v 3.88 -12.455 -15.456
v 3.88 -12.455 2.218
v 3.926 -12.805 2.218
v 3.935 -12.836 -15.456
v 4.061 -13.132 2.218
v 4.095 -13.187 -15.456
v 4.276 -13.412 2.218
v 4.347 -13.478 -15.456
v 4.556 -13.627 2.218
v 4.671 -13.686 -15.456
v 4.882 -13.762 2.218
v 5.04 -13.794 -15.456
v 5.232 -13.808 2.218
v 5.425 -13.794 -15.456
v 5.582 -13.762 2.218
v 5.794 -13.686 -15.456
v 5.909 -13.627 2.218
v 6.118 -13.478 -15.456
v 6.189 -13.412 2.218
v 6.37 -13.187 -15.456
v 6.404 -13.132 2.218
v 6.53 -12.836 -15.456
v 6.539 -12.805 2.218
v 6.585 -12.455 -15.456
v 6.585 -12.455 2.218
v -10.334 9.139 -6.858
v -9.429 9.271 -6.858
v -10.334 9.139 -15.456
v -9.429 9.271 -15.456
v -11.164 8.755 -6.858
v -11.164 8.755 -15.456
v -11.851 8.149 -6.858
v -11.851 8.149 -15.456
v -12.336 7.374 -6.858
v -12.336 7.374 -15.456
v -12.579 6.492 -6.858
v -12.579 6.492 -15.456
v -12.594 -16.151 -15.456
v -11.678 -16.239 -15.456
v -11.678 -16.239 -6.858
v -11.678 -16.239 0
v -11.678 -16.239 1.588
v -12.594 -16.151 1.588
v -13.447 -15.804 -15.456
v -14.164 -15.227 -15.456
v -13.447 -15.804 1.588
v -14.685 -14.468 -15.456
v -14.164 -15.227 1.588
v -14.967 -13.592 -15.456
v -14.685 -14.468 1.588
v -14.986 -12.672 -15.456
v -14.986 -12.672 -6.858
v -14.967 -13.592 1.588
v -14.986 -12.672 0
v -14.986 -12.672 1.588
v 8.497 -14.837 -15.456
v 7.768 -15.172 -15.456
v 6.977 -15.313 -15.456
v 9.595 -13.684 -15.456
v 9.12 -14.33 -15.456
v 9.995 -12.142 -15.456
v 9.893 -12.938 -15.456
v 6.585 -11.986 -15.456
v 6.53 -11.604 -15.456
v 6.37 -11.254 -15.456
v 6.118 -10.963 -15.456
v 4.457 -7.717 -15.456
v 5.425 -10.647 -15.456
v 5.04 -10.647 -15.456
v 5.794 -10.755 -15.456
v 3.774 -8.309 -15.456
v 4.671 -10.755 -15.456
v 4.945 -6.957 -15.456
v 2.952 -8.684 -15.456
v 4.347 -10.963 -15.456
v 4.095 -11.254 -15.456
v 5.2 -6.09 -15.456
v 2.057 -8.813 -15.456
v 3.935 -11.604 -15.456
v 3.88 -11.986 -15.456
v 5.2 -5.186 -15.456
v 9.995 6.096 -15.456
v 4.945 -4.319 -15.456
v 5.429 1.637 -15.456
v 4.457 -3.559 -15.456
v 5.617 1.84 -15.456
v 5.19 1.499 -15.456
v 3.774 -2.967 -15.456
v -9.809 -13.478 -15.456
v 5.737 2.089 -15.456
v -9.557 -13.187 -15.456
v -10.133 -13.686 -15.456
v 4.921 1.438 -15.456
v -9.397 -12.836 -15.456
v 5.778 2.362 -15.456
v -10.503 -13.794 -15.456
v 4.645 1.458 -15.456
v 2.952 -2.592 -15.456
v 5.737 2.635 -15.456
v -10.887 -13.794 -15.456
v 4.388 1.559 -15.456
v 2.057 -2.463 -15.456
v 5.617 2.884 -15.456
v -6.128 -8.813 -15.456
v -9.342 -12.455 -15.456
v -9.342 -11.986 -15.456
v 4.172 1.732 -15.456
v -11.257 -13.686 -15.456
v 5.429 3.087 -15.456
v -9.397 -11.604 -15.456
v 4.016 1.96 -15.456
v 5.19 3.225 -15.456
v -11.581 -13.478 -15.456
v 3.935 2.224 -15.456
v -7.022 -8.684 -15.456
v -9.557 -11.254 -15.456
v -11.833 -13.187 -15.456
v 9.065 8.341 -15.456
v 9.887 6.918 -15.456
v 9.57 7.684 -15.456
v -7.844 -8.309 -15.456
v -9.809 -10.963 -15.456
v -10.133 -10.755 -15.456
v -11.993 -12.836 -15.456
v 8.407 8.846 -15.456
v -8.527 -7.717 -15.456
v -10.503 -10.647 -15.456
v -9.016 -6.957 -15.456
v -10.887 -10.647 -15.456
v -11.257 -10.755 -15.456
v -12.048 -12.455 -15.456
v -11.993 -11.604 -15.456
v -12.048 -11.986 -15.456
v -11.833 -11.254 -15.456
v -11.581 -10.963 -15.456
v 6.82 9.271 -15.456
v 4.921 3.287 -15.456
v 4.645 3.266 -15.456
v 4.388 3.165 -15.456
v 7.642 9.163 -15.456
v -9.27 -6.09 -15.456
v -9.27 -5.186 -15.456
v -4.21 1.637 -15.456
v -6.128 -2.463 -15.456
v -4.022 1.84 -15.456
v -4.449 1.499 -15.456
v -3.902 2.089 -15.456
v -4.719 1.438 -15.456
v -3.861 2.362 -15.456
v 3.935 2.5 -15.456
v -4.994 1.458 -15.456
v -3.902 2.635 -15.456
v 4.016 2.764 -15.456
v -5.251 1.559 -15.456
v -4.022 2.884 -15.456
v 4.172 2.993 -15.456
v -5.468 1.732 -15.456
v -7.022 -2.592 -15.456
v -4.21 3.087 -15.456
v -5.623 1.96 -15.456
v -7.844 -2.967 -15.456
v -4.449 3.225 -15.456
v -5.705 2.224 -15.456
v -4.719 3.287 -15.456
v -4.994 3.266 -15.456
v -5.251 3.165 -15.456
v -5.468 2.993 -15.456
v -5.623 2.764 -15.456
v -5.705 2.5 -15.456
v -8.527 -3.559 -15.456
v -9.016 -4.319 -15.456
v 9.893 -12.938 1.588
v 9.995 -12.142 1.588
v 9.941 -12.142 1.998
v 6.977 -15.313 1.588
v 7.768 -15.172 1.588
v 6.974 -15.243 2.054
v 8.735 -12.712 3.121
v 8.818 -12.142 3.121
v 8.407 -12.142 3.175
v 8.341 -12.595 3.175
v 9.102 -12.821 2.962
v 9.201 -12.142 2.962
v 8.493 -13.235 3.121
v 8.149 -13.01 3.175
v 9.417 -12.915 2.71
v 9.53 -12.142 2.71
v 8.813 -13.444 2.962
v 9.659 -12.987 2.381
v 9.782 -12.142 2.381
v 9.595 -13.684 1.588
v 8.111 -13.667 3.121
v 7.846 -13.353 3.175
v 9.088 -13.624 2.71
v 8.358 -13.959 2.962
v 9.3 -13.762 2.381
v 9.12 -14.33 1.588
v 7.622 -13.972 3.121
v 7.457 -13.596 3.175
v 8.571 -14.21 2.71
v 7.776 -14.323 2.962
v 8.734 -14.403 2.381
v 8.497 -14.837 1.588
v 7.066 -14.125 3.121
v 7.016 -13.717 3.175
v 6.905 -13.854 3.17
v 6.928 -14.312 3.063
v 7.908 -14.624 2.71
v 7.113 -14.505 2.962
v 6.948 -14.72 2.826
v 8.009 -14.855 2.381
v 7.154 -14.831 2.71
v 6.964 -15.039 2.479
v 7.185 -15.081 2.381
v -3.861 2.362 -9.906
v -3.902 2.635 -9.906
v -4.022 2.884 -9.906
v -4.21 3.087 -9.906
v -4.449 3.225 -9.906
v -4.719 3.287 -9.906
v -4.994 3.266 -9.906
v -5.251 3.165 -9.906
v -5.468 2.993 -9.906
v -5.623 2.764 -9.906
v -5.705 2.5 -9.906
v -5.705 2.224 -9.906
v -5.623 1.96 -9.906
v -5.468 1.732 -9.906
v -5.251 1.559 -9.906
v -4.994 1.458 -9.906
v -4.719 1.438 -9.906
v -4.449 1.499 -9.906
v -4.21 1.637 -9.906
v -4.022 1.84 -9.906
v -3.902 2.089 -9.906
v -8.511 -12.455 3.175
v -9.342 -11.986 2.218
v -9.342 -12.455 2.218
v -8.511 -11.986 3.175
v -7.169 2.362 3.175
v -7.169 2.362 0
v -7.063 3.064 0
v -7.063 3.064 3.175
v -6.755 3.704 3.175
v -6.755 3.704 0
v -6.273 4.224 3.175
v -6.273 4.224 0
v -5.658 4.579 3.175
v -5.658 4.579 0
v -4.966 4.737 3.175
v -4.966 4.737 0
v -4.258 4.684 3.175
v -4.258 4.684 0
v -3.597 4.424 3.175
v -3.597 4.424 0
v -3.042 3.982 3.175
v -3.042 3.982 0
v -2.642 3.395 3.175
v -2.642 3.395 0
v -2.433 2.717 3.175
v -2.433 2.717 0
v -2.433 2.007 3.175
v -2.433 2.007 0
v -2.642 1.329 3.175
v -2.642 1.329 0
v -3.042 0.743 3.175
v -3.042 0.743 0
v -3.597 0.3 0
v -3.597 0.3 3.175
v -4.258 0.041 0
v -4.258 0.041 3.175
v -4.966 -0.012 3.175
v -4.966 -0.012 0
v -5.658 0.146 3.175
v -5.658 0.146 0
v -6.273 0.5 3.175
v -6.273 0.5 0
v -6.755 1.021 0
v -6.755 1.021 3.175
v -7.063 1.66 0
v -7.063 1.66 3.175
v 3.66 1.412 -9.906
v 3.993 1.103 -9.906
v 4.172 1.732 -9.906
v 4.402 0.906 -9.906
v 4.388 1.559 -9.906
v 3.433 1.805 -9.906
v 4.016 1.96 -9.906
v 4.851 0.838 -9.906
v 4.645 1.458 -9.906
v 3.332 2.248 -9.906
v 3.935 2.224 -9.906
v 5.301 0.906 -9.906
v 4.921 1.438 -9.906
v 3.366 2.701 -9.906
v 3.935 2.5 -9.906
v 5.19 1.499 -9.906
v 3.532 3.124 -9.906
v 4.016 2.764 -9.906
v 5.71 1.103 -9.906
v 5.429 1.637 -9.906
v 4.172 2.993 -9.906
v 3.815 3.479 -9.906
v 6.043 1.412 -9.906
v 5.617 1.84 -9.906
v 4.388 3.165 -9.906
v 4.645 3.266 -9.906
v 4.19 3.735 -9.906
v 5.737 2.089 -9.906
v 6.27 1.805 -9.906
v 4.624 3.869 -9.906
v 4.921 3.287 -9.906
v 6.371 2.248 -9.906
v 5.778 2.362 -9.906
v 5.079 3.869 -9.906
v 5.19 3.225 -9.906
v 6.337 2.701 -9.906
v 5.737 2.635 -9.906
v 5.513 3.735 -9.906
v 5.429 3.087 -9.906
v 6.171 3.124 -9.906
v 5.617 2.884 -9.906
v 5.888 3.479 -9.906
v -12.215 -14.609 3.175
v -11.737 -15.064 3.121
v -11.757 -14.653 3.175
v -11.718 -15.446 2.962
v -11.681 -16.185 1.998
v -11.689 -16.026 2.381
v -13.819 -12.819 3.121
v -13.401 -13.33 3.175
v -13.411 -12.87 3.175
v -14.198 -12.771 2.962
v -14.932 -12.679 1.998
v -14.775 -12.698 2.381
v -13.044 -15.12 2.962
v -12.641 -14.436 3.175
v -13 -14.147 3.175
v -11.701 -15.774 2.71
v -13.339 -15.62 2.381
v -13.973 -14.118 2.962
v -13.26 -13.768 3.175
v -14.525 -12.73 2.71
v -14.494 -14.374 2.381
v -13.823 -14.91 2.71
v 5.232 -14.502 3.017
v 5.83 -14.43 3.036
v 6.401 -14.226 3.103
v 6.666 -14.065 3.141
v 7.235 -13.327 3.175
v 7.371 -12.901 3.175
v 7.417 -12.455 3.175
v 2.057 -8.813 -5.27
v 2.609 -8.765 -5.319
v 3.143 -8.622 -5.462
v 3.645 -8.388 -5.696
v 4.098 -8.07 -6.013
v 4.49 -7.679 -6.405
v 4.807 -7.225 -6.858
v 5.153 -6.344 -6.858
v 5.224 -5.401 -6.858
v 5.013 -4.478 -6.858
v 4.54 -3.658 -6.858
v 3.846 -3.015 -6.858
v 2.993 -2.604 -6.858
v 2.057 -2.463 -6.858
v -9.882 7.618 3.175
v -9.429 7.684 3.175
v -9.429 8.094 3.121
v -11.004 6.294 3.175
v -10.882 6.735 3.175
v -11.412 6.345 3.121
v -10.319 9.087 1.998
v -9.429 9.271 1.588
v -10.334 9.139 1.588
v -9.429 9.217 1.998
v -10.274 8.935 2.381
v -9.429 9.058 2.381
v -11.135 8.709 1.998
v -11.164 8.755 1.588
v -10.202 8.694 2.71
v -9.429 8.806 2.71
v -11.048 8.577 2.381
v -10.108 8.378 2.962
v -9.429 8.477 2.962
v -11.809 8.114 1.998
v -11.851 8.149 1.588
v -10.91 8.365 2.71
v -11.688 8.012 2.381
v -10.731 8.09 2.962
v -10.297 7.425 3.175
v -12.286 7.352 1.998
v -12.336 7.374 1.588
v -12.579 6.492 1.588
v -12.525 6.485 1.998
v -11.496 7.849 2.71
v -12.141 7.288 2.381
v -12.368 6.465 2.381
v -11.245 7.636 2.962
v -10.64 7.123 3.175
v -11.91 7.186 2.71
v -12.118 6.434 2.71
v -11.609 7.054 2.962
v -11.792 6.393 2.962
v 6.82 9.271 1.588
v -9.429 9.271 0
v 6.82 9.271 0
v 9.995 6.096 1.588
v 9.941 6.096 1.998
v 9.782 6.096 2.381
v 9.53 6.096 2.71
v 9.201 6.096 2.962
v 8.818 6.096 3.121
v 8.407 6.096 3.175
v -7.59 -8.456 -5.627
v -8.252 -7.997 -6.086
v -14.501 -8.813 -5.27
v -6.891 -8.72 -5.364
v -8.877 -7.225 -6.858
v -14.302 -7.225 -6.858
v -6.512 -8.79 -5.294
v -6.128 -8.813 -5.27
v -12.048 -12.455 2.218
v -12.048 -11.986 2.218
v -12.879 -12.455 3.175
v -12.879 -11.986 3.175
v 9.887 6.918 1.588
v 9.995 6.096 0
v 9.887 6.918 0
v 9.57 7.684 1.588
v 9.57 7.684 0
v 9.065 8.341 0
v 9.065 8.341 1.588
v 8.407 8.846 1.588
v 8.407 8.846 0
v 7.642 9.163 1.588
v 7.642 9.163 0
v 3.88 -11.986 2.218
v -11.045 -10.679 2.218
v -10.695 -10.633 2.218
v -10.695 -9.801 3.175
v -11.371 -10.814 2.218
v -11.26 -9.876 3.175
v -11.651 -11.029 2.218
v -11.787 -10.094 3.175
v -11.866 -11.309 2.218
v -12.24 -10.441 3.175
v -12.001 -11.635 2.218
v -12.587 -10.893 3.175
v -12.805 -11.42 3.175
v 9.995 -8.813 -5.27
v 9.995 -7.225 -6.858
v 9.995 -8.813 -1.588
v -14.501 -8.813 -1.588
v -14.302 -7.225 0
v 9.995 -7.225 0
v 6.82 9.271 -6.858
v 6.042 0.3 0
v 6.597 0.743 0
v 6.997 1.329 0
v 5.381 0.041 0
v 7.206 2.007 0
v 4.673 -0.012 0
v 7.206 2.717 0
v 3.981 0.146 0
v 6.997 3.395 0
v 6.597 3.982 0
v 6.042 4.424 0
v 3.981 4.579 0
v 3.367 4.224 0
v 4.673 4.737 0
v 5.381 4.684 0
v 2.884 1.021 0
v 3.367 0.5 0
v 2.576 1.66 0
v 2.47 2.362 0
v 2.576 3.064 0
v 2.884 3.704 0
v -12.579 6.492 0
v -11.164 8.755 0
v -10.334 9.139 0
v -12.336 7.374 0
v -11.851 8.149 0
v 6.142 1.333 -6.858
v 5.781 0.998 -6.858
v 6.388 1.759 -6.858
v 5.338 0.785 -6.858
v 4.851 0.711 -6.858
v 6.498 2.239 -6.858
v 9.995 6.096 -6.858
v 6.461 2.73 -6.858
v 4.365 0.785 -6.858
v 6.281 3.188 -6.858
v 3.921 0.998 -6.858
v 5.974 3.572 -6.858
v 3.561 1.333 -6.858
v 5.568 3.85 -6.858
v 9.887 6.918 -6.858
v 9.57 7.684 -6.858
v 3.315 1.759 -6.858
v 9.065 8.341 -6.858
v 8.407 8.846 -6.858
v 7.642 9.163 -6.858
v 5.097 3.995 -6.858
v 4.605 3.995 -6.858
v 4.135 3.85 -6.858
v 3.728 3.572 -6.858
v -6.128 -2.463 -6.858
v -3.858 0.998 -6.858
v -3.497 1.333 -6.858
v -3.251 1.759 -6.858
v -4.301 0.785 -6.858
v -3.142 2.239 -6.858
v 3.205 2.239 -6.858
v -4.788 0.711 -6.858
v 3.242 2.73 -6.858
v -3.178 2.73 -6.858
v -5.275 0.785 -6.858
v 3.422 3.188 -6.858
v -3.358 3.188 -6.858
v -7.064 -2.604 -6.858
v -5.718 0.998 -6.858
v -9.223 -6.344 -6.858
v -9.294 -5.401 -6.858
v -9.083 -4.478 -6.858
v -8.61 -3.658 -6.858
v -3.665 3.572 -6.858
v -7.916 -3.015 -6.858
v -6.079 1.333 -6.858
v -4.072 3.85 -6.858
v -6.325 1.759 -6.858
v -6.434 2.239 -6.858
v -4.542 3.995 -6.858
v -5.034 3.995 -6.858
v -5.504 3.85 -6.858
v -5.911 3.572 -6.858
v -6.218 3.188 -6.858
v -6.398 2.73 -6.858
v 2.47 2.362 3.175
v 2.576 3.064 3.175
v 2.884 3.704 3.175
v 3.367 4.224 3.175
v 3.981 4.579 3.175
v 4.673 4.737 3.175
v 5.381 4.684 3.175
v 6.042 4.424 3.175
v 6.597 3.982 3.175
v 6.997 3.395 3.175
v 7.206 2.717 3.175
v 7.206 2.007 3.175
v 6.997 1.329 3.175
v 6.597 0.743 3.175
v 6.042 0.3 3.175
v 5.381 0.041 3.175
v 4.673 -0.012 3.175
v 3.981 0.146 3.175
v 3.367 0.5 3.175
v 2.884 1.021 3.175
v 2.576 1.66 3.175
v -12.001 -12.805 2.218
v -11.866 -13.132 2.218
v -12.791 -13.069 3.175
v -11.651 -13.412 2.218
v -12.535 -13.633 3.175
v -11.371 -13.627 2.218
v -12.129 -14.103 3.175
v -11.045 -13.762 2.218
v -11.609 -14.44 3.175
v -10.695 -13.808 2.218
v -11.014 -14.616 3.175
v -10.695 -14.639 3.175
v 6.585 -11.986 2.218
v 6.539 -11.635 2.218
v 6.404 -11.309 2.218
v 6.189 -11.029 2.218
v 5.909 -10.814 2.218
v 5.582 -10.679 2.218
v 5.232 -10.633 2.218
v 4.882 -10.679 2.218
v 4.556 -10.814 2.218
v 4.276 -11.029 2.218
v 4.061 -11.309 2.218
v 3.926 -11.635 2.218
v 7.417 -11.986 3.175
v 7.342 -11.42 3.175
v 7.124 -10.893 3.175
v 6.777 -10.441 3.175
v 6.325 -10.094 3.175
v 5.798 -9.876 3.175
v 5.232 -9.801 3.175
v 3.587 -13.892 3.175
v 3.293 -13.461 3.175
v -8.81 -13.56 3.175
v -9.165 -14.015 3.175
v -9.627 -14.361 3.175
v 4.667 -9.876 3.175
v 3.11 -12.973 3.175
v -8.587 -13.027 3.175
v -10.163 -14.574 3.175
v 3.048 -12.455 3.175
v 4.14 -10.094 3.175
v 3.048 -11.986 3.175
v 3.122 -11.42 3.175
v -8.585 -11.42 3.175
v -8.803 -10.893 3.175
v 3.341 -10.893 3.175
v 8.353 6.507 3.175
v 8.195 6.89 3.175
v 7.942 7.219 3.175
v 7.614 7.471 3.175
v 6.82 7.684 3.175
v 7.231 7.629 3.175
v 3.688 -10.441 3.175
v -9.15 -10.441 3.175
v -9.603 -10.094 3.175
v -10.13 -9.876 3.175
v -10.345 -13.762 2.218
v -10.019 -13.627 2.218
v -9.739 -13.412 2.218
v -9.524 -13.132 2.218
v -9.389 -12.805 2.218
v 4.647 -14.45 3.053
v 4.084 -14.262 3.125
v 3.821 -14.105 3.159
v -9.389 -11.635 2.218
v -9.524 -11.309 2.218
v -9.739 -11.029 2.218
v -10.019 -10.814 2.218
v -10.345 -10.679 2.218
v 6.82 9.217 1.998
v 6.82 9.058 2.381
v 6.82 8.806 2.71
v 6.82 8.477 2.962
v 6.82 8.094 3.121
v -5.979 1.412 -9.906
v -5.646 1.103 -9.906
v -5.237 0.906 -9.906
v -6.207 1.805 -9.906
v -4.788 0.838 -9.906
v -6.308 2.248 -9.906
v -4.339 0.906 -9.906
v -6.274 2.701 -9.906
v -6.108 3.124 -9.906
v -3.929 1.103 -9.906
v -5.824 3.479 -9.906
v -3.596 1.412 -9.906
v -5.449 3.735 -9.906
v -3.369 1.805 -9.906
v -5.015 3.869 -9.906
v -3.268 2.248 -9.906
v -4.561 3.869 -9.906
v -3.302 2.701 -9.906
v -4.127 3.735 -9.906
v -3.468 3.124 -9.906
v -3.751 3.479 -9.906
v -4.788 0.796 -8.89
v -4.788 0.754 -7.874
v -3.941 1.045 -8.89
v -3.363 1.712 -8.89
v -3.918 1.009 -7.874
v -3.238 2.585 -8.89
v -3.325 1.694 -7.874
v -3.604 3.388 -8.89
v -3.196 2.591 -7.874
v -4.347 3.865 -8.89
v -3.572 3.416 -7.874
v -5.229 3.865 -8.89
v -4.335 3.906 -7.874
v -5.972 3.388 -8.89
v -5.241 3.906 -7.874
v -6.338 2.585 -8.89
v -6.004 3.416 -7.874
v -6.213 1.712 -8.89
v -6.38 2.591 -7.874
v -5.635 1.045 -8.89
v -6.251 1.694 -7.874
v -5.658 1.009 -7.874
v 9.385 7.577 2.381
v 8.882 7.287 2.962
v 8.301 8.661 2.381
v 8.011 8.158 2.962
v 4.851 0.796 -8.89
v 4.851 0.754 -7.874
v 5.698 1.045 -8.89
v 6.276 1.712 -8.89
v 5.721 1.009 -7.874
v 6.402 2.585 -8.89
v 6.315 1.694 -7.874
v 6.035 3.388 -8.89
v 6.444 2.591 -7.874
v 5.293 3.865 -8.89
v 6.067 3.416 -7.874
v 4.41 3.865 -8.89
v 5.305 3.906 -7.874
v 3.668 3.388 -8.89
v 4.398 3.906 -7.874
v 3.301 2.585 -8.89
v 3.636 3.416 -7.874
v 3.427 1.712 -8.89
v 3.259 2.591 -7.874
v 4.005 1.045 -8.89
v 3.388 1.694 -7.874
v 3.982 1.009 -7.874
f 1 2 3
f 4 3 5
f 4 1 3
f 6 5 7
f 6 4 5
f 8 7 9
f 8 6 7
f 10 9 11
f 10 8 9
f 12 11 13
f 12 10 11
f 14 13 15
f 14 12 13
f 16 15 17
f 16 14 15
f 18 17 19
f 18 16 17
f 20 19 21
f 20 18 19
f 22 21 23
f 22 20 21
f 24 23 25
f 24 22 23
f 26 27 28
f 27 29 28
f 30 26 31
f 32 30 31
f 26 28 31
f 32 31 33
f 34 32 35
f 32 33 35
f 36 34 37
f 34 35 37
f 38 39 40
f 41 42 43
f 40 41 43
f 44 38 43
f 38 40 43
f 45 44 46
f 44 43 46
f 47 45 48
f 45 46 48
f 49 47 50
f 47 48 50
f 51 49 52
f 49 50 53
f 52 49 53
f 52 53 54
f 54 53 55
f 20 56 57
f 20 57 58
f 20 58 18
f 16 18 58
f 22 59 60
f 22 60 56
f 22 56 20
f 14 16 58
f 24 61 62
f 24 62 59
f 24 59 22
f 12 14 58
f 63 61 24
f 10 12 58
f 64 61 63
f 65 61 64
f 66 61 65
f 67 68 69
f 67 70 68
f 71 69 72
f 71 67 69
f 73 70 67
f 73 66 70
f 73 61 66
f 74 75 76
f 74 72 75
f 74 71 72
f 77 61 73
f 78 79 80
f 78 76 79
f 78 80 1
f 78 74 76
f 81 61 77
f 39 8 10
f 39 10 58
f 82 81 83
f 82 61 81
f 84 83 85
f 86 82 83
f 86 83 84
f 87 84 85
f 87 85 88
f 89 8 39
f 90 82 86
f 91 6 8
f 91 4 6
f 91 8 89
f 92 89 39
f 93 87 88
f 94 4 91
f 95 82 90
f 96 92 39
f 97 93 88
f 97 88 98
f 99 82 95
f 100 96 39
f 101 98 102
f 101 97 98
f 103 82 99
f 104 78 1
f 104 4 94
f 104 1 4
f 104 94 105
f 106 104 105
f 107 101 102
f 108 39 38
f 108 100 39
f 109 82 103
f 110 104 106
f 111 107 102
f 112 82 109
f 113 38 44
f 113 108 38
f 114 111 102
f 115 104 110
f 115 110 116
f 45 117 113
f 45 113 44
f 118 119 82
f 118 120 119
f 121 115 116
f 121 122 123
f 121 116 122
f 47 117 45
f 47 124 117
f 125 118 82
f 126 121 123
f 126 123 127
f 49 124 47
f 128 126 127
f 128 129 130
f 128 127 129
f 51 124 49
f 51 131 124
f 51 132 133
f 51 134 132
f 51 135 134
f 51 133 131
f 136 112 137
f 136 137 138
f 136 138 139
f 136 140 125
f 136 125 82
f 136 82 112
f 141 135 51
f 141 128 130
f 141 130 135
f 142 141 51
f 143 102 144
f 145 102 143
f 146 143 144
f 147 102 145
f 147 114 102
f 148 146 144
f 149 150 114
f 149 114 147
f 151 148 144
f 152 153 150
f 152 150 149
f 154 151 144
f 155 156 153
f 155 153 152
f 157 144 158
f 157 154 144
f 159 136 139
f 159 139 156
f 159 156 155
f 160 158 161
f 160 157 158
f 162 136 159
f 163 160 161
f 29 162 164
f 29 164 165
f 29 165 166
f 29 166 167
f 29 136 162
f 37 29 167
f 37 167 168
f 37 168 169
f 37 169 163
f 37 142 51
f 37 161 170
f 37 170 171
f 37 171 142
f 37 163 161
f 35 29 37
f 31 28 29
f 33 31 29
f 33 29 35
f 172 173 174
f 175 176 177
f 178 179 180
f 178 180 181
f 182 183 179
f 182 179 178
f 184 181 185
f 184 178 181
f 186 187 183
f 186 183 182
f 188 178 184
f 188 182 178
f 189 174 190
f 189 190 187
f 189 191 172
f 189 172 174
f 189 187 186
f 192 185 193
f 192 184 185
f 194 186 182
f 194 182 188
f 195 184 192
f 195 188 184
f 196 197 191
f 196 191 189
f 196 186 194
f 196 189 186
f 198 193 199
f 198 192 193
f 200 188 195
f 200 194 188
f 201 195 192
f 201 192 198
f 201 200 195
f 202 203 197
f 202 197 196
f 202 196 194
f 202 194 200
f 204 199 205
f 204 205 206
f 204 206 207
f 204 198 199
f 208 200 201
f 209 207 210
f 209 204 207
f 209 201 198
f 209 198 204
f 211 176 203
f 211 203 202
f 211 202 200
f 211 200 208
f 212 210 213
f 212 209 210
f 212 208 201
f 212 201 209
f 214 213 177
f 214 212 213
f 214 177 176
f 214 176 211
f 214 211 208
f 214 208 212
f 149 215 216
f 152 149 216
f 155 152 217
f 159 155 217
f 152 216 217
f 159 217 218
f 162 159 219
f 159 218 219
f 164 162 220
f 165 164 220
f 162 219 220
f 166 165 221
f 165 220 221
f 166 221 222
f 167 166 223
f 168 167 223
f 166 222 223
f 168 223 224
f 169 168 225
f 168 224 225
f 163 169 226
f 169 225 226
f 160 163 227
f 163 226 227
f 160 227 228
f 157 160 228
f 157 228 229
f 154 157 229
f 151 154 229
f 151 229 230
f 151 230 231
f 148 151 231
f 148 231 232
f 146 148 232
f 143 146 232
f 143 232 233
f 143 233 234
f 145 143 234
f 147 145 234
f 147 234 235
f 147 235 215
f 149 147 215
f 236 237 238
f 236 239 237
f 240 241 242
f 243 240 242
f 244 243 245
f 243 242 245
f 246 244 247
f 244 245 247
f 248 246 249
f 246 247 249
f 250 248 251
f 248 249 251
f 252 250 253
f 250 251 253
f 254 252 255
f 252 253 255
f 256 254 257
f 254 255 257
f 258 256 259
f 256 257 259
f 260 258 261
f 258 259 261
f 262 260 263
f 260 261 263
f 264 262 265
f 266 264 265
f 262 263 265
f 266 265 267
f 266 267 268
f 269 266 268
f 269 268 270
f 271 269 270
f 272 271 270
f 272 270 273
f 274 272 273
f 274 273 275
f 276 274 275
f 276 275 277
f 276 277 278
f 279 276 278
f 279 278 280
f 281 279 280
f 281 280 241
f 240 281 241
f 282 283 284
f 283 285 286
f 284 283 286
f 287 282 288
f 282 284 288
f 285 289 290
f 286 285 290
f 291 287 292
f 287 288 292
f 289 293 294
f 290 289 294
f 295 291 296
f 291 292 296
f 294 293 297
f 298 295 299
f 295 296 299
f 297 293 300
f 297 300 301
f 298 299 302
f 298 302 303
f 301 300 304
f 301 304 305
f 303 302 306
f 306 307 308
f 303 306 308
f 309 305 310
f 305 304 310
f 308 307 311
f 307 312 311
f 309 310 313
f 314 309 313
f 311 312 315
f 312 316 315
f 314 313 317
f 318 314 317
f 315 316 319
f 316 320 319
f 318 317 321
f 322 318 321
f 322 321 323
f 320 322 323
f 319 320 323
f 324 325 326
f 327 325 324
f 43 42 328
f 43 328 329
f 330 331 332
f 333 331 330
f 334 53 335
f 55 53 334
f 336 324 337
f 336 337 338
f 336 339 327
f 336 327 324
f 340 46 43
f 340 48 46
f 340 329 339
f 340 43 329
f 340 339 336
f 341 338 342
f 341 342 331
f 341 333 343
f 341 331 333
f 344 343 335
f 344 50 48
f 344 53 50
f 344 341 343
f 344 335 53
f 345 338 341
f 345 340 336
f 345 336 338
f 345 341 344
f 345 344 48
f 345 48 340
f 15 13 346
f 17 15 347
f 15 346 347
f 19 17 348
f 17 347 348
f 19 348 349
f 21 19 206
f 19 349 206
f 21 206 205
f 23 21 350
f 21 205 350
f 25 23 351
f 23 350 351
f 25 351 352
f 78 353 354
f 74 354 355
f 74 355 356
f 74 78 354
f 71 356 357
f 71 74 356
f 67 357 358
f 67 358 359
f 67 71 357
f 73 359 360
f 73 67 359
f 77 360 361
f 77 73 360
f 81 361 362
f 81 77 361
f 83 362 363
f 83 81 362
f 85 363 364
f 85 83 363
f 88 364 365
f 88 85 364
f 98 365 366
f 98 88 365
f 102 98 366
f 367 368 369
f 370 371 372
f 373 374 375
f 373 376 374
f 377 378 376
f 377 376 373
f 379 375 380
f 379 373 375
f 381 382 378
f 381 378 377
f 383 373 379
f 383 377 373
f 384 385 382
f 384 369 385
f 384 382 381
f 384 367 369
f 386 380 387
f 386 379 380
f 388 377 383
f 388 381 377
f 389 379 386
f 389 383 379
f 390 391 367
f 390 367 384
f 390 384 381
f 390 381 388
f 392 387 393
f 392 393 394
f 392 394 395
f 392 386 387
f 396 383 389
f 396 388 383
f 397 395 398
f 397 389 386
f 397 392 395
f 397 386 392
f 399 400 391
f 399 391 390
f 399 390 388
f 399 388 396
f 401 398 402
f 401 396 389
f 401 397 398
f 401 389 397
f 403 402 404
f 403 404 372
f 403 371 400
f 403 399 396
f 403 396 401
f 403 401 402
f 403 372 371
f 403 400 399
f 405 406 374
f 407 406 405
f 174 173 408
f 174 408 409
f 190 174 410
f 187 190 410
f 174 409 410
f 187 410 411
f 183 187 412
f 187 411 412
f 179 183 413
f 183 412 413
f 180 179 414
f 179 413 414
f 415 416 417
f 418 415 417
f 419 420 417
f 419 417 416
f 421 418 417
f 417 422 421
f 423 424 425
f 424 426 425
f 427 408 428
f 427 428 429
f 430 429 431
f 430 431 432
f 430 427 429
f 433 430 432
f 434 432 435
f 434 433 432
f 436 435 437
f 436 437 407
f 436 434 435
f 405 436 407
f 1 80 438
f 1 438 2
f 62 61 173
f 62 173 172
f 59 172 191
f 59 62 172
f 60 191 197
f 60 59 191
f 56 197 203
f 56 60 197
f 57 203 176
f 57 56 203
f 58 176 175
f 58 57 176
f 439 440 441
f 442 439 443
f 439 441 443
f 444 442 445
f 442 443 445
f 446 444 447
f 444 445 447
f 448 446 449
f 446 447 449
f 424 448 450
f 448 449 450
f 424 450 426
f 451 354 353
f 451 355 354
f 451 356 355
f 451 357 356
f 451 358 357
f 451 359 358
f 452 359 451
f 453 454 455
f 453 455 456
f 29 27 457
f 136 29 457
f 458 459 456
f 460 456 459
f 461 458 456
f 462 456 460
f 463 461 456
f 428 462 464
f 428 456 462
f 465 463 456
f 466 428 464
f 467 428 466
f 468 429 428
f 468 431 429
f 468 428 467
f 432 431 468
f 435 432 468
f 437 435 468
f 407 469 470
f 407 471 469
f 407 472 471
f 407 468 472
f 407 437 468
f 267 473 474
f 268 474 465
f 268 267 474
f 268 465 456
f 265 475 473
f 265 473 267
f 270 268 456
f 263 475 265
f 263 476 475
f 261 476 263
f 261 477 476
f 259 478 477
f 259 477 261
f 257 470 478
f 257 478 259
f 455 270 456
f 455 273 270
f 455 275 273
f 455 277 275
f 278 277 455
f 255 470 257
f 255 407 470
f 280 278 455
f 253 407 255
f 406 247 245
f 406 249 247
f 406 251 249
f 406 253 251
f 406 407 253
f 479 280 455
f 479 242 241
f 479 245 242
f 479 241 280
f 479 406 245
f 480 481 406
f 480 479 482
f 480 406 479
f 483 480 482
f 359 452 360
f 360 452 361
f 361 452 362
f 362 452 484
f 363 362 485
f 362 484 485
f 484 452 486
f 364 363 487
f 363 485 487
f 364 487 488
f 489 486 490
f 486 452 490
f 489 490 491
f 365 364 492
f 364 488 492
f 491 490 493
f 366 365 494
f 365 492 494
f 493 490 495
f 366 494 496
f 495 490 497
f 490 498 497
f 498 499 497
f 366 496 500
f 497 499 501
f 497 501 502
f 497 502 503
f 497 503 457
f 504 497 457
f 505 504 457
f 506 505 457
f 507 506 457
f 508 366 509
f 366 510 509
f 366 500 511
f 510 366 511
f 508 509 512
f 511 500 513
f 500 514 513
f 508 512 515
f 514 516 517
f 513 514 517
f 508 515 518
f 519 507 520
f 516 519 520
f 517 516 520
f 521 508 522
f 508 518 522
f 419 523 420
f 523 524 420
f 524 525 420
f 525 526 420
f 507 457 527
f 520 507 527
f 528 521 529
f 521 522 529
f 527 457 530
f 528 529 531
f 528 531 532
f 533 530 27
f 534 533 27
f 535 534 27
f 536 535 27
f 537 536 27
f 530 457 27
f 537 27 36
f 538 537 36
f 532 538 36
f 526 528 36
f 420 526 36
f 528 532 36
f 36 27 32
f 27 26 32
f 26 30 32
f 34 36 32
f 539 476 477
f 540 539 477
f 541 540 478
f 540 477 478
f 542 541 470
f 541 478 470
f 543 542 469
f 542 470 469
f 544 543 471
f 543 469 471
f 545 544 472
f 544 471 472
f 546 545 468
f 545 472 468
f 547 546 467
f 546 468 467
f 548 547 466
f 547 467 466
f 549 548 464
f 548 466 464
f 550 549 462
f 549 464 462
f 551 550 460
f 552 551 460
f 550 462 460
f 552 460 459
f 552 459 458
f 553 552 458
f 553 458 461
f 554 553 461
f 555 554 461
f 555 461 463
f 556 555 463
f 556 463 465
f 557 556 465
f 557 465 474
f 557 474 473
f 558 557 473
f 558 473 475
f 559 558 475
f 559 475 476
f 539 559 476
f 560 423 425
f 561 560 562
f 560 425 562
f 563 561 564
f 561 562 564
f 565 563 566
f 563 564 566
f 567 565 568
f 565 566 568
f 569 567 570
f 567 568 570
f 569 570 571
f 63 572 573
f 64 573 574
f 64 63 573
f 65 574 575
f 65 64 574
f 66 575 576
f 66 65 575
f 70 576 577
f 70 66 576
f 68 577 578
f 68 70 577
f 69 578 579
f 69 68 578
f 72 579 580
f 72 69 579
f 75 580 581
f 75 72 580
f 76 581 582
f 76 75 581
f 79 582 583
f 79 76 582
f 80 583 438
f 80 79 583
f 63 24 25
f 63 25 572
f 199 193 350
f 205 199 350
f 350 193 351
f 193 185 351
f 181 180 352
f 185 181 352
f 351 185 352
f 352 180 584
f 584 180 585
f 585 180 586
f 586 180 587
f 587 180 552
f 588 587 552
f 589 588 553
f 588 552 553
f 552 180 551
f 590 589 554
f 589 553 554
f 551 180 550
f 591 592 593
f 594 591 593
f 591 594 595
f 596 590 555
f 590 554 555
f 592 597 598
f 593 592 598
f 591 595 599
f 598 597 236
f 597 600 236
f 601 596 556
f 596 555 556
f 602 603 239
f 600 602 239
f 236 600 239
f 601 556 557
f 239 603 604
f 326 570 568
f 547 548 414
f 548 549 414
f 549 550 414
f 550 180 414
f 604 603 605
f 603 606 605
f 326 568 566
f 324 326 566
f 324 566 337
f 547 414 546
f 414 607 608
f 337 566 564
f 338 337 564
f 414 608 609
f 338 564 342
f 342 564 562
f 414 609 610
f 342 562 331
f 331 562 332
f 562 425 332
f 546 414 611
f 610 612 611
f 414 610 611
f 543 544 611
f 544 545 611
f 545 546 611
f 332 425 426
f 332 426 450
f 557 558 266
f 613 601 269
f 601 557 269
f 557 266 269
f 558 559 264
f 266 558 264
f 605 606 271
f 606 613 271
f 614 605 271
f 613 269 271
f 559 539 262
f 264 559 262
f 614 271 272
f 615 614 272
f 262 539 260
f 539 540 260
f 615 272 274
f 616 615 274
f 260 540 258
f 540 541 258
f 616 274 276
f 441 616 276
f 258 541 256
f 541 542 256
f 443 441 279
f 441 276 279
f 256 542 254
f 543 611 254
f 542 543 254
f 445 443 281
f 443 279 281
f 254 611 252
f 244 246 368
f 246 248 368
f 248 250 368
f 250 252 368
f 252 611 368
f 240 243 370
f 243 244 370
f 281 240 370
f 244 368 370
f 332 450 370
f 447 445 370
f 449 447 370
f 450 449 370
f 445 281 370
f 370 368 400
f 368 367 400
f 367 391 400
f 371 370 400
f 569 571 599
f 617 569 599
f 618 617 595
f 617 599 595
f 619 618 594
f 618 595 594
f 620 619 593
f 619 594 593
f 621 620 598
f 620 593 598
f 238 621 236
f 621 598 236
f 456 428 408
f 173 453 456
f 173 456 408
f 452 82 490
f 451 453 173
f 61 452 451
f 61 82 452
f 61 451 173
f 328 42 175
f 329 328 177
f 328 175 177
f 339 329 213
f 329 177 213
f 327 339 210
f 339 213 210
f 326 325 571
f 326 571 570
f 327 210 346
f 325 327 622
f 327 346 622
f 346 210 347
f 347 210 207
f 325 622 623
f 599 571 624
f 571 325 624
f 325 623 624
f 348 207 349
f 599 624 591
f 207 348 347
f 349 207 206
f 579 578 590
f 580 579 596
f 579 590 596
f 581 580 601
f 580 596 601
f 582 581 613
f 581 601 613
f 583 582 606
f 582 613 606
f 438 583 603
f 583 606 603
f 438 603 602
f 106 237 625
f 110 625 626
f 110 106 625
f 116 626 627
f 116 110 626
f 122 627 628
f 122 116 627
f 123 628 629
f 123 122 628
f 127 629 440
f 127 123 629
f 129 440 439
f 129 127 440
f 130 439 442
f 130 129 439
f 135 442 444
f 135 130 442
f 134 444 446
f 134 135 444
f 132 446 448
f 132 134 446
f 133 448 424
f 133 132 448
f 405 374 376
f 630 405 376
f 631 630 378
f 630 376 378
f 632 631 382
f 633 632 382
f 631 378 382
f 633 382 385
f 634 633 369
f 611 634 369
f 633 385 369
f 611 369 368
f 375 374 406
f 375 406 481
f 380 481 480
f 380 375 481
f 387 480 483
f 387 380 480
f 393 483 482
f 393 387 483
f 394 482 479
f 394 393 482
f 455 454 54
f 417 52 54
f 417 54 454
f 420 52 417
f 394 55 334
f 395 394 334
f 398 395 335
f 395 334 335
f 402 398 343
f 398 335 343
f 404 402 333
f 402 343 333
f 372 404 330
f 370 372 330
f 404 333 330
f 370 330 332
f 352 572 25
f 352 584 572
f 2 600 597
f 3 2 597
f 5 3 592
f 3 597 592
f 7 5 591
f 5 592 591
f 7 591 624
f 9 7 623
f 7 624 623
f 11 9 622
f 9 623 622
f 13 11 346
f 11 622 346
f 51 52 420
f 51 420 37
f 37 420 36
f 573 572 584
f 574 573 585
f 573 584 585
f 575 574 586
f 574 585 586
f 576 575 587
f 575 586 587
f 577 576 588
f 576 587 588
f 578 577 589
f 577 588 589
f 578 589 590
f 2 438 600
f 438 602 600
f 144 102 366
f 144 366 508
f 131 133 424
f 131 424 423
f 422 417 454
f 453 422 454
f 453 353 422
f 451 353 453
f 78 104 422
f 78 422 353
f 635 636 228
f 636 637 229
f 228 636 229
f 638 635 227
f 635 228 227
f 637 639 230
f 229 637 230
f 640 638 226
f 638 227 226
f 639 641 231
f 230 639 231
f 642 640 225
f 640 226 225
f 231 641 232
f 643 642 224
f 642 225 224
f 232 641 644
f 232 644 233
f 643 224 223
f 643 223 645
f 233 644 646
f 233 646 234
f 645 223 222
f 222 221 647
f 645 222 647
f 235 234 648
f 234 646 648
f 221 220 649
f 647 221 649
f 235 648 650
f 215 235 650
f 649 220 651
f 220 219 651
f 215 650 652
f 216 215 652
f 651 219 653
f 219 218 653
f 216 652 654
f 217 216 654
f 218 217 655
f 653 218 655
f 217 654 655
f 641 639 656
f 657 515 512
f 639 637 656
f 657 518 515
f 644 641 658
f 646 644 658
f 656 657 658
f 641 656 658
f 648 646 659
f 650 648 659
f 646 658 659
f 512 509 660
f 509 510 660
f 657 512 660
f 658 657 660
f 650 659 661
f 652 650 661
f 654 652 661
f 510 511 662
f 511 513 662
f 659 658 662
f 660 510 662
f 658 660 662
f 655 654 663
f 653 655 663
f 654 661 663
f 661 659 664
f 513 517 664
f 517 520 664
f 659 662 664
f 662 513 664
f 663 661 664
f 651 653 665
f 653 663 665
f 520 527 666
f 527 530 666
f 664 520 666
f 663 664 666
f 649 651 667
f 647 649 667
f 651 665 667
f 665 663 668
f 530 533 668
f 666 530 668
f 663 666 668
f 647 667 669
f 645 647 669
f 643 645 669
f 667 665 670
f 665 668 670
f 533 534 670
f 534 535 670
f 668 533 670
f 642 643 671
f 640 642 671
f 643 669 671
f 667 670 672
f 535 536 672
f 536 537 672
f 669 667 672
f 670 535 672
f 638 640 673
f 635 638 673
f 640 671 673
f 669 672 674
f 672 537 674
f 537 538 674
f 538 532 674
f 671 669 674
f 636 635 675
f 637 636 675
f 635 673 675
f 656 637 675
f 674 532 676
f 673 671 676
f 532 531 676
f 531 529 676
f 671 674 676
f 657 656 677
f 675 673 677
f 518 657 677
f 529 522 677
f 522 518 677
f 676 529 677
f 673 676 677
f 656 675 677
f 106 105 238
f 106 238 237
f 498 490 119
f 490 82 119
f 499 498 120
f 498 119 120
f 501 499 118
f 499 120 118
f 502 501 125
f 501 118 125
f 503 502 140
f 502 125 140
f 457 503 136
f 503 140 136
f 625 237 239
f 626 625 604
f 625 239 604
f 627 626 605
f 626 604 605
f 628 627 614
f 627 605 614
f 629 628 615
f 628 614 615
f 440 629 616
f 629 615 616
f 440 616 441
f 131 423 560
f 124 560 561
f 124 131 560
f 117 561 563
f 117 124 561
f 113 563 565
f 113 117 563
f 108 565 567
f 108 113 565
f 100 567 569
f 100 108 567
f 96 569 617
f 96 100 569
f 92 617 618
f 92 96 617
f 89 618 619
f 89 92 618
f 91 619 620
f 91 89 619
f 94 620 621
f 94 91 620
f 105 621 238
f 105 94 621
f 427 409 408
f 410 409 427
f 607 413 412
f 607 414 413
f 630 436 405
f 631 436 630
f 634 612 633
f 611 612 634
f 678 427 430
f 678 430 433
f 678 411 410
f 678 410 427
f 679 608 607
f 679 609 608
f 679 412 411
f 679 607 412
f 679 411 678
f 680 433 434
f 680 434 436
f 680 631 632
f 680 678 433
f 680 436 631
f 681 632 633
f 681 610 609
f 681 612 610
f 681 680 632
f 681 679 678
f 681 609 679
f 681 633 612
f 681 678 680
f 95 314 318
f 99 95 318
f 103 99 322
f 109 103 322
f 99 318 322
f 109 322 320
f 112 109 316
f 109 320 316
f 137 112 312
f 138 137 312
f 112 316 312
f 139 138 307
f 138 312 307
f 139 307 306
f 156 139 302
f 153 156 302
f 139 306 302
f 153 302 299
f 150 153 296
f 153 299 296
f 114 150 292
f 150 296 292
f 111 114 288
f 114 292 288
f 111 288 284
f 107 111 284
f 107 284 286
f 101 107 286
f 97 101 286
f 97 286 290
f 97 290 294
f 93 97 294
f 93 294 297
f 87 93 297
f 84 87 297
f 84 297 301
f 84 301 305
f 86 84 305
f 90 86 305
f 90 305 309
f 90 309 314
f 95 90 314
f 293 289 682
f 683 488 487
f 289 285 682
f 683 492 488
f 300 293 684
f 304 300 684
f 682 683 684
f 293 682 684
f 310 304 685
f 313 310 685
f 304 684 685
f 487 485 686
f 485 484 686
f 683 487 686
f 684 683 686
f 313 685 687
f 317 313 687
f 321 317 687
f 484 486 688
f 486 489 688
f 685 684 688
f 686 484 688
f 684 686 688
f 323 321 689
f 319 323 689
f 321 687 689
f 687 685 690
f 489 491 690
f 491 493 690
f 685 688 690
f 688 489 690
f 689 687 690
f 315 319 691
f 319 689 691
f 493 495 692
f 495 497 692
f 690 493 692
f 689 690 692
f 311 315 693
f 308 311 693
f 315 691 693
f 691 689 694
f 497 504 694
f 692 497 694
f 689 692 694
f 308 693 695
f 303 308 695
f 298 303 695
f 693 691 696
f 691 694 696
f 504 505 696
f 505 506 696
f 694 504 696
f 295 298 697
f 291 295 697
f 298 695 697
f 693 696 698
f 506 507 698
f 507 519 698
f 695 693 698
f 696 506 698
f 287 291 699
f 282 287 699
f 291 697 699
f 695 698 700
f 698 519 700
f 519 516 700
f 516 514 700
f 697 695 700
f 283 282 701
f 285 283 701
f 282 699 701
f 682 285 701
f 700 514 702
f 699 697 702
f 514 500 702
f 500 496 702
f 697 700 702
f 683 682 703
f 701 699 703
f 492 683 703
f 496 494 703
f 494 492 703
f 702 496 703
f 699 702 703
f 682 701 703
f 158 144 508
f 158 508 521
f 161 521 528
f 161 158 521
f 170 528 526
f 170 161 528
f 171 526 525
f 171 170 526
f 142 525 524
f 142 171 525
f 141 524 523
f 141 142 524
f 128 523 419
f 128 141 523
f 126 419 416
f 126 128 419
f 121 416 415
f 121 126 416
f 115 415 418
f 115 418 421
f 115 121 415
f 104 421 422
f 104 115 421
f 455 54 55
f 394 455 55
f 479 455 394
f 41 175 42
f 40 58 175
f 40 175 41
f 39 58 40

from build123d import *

# Parameters (mm, degrees)
BOSS_EXTRUDE1_DEPTH                           = 3.175
BOSS_EXTRUDE2_START                           = -6.858
BOSS_EXTRUDE2_DEPTH                           = 8.5979
BOSS_EXTRUDE3_DEPTH                           = 6.858
CSK_START                                     = -16
CSK_SLOT_FOR_2_FLAT_HEAD_MACHINE_SCREW1_DEPTH = 20
FILLET1_R                                     = 3.175
CHAMFER1_SIZE                                 = 1.5875
F_3_16_0_1875_DIAMETER_HOLE1_D                = 4.7625
F_3_16_0_1875_DIAMETER_HOLE1_DEPTH            = 3.175
F_0_CLEARANCE_HOLE1_D                         = 1.8542
HOLE1_AT_2_COUNT                              = 2
HOLE1_AT_2_PITCH                              = 9.6393
CUT_EXTRUDE2_REACH                            = 30.918
FILLET3_R                                     = 1.5875


with BuildPart() as part:
    # Sketch1 → Boss-Extrude1 (new body)
    with BuildSketch(Plane.XY):
        Polygon((9.9949, 9.271), (9.9949, -15.162995595), (-15.457511269, -16.426312325), (-12.2301, 9.271), align=None)
    extrude(amount=BOSS_EXTRUDE1_DEPTH)



with BuildPart() as body_2:
    # Sketch1<2> → Boss-Extrude2 (new body)
    with BuildSketch(Plane.XY.offset(BOSS_EXTRUDE2_START)):
        Polygon((9.9949, 9.271), (9.9949, -15.162995595), (-15.457511269, -16.426312325), (-12.2301, 9.271), align=None)
    extrude(amount=-BOSS_EXTRUDE2_DEPTH)


with BuildPart() as part_1:
    add(part.part)

    add(body_2.part)  # Boss-Extrude3 merges body 2
    # Sketch3 → Boss-Extrude3 (add)
    with BuildSketch(Plane.XY.offset(-6.858)):
        Polygon((9.9949, -8.812995595), (9.9949, -15.162995595), (-15.457511269, -16.426312325), (-14.501329397, -8.812995595), align=None)
    extrude(amount=BOSS_EXTRUDE3_DEPTH)

    # CSK SLOT for #2 Flat Head Machine Screw1: read off the stored shape, not the designer's step
    # CSK SLOT for _2 Flat Head Machine Sc 2 → CSK SLOT for #2 Flat Head Machine Screw1 (cut)
    with BuildSketch(Plane.XY.offset(CSK_START)):
        with BuildLine():
            Line((-9.342461269, -12.455421191), (-9.342461269, -11.985521191))
            ThreePointArc((-9.342461269, -11.985521191), (-10.695011269, -10.632971191), (-12.047561269, -11.985521191))
            Line((-12.047561269, -11.985521191), (-12.047561269, -12.455421191))
            ThreePointArc((-12.047561269, -12.455421191), (-10.695011269, -13.807971191), (-9.342461269, -12.455421191))
        make_face()
        with BuildLine():
            Line((6.58495, -12.455421191), (6.58495, -11.985521191))
            ThreePointArc((6.58495, -11.985521191), (5.2324, -10.632971191), (3.87985, -11.985521191))
            Line((3.87985, -11.985521191), (3.87985, -12.455421191))
            ThreePointArc((3.87985, -12.455421191), (5.2324, -13.807971191), (6.58495, -12.455421191))
        make_face()
    extrude(amount=CSK_SLOT_FOR_2_FLAT_HEAD_MACHINE_SCREW1_DEPTH, mode=Mode.SUBTRACT)

    # CSK SLOT for _2 Flat Head Machine Sc 3: loft between two sections, ruled curve by curve
    csk_slot_for_2_flat_head_machine_sc_3_from = [
        Edge.make_three_point_arc((-9.342461269, -11.985521191, 2.21806604), (-9.738613992, -11.029123914, 2.21806604), (-10.695011269, -10.632971191, 2.21806604)),
        Edge.make_three_point_arc((-10.695011269, -10.632971191, 2.21806604), (-11.651408546, -11.029123914, 2.21806604), (-12.047561269, -11.985521191, 2.21806604)),
        Edge.make_three_point_arc((-12.047561269, -12.455421191, 2.21806604), (-11.651408546, -13.411818468, 2.21806604), (-10.695011269, -13.807971191, 2.21806604)),
        Edge.make_three_point_arc((-10.695011269, -13.807971191, 2.21806604), (-9.738613992, -13.411818468, 2.21806604), (-9.342461269, -12.455421191, 2.21806604)),
        Edge.make_line((-12.047561269, -11.985521191, 2.21806604), (-12.047561269, -12.455421191, 2.21806604)),
        Edge.make_line((-9.342461269, -11.985521191, 2.21806604), (-9.342461269, -12.455421191, 2.21806604)),
    ]
    csk_slot_for_2_flat_head_machine_sc_3_to = [
        Edge.make_three_point_arc((-8.510611269, -11.985521191, 3.175), (-9.150407216, -10.440917138, 3.175), (-10.695011269, -9.801121191, 3.175)),
        Edge.make_three_point_arc((-10.695011269, -9.801121191, 3.175), (-12.239615322, -10.440917138, 3.175), (-12.879411269, -11.985521191, 3.175)),
        Edge.make_three_point_arc((-12.879411269, -12.455421191, 3.175), (-12.239615322, -14.000025244, 3.175), (-10.695011269, -14.639821191, 3.175)),
        Edge.make_three_point_arc((-10.695011269, -14.639821191, 3.175), (-9.150407216, -14.000025244, 3.175), (-8.510611269, -12.455421191, 3.175)),
        Edge.make_line((-12.879411269, -11.985521191, 3.175), (-12.879411269, -12.455421191, 3.175)),
        Edge.make_line((-8.510611269, -11.985521191, 3.175), (-8.510611269, -12.455421191, 3.175)),
    ]
    csk_slot_for_2_flat_head_machine_sc_3 = Solid(Shell([*[Face.make_surface_from_curves(csk_slot_for_2_flat_head_machine_sc_3_from[k], csk_slot_for_2_flat_head_machine_sc_3_to[k]) for k in range(6)], Face(Wire(csk_slot_for_2_flat_head_machine_sc_3_from)), Face(Wire(csk_slot_for_2_flat_head_machine_sc_3_to))]))
    add(csk_slot_for_2_flat_head_machine_sc_3, mode=Mode.SUBTRACT)

    # CSK SLOT for _2 Flat Head Machine Sc 4: loft between two sections, ruled curve by curve
    csk_slot_for_2_flat_head_machine_sc_4_from = [
        Edge.make_three_point_arc((6.58495, -11.985521191, 2.21806604), (6.188797277, -11.029123914, 2.21806604), (5.2324, -10.632971191, 2.21806604)),
        Edge.make_three_point_arc((5.2324, -10.632971191, 2.21806604), (4.276002723, -11.029123914, 2.21806604), (3.87985, -11.985521191, 2.21806604)),
        Edge.make_three_point_arc((3.87985, -12.455421191, 2.21806604), (4.276002723, -13.411818468, 2.21806604), (5.2324, -13.807971191, 2.21806604)),
        Edge.make_three_point_arc((5.2324, -13.807971191, 2.21806604), (6.188797277, -13.411818468, 2.21806604), (6.58495, -12.455421191, 2.21806604)),
        Edge.make_line((3.87985, -11.985521191, 2.21806604), (3.87985, -12.455421191, 2.21806604)),
        Edge.make_line((6.58495, -11.985521191, 2.21806604), (6.58495, -12.455421191, 2.21806604)),
    ]
    csk_slot_for_2_flat_head_machine_sc_4_to = [
        Edge.make_three_point_arc((7.4168, -11.985521191, 3.175), (6.777004053, -10.440917138, 3.175), (5.2324, -9.801121191, 3.175)),
        Edge.make_three_point_arc((5.2324, -9.801121191, 3.175), (3.687795947, -10.440917138, 3.175), (3.048, -11.985521191, 3.175)),
        Edge.make_three_point_arc((3.048, -12.455421191, 3.175), (3.687795947, -14.000025244, 3.175), (5.2324, -14.639821191, 3.175)),
        Edge.make_three_point_arc((5.2324, -14.639821191, 3.175), (6.777004053, -14.000025244, 3.175), (7.4168, -12.455421191, 3.175)),
        Edge.make_line((3.048, -11.985521191, 3.175), (3.048, -12.455421191, 3.175)),
        Edge.make_line((7.4168, -11.985521191, 3.175), (7.4168, -12.455421191, 3.175)),
    ]
    csk_slot_for_2_flat_head_machine_sc_4 = Solid(Shell([*[Face.make_surface_from_curves(csk_slot_for_2_flat_head_machine_sc_4_from[k], csk_slot_for_2_flat_head_machine_sc_4_to[k]) for k in range(6)], Face(Wire(csk_slot_for_2_flat_head_machine_sc_4_from)), Face(Wire(csk_slot_for_2_flat_head_machine_sc_4_to))]))
    add(csk_slot_for_2_flat_head_machine_sc_4, mode=Mode.SUBTRACT)

    # Fillet1
    fillet1_edges = [part_1.edges().sort_by_distance(p)[0] for p in [
        (-12.2301, 9.271, -11.15695),
        (9.9949, 9.271, -11.15695),
        (9.9949, 9.271, 1.5875),
        (9.9949, -15.162995595, -6.14045),
        (-15.457511269, -16.426312325, -6.14045),
        (-12.2301, 9.271, 1.5875),
    ]]
    fillet(fillet1_edges, radius=FILLET1_R)

    # Chamfer1
    chamfer1_edges = [part_1.edges().sort_by_distance(p)[0] for p in [
        (-2.253214698, -8.812995595, -6.858),
        (-2.253214698, -8.812995595, 0),
    ]]
    chamfer(chamfer1_edges, length=CHAMFER1_SIZE)

    # 3/16 (0.1875) Diameter Hole1
    with Locations(Plane.XY.offset(3.175)):
        with Locations((4.8514, 2.3622), (-4.7879, 2.3622)):
            Hole(F_3_16_0_1875_DIAMETER_HOLE1_D / 2, depth=F_3_16_0_1875_DIAMETER_HOLE1_DEPTH)

    # #0 Clearance Hole1 (through all)
    with Locations(Plane(origin=(0, 0, -15.4559), x_dir=(-1, 0, 0), z_dir=(0, 0, -1))):
        with Locations((-4.8514, 2.3622), (4.7879, 2.3622)):
            Hole(F_0_CLEARANCE_HOLE1_D / 2)

    # Sketch11 → Hole1 (revolve, cut)
    with BuildSketch(Plane(origin=(4.8514, 2.3622, -6.858), x_dir=(0, -1, 0), z_dir=(1, 0, 0))):
        Polygon((0, 0), (0, 3.048), (1.524, 3.048), (1.651, 0), align=None)
    hole1 = revolve(axis=Axis((4.8514, 2.3622, -116.858), (0, 0, 1)), mode=Mode.SUBTRACT)

    # Hole1 at 2: Hole1 ×2
    with Locations(*[(-i * HOLE1_AT_2_PITCH, 0, 0) for i in range(1, HOLE1_AT_2_COUNT)]):
        add(hole1, mode=Mode.SUBTRACT)

    # Sketch13 → Cut-Extrude2 (cut, up to next)
    with BuildSketch(Plane(origin=(0, 0, -15.4559), x_dir=(-1, 0, 0), z_dir=(0, 0, -1)), mode=Mode.PRIVATE) as cut_extrude2_sk1:
        with BuildLine():
            Line((-2.0574, -2.462995595), (6.127656415, -2.462995595))
            ThreePointArc((6.127656415, -2.462995595), (9.302656415, -5.637995595), (6.127656415, -8.812995595))
            Line((6.127656415, -8.812995595), (-2.0574, -8.812995595))
            ThreePointArc((-2.0574, -8.812995595), (-5.2324, -5.637995595), (-2.0574, -2.462995595))
        make_face()
    cut_extrude2_tool1 = extrude(cut_extrude2_sk1.sketch, amount=-CUT_EXTRUDE2_REACH, mode=Mode.PRIVATE) & part_1.part
    add(cut_extrude2_tool1.solids().sort_by_distance((-2.035128, -5.637996, -15.4559))[0], mode=Mode.SUBTRACT)

    # Fillet3
    # the kernel refuses this fillet: 1.5875 mm, written as the material it takes off along each edge
    with BuildSketch(Plane(origin=(-14.985993213, -12.67198858, 3.175), x_dir=(0.9922052502363689, -0.12461437077393937, 0), z_dir=(0.12461437077393936, 0.9922052502363689, 0))) as fillet3_piece_1:
        with BuildLine():
            CenterArc((FILLET3_R, FILLET3_R), FILLET3_R, 180, 90)
            Line((0, FILLET3_R), (0, 0))
            Line((0, 0), (FILLET3_R, 0))
        make_face()
    extrude(amount=19.314188473, mode=Mode.SUBTRACT)
    with BuildSketch(Plane(origin=(-9.4289161, 9.271, 3.175), x_dir=(0, -1, 0), z_dir=(1, 0, 0))) as fillet3_piece_2:
        with BuildLine():
            CenterArc((FILLET3_R, FILLET3_R), FILLET3_R, 180, 90)
            Line((0, FILLET3_R), (0, 0))
            Line((0, 0), (FILLET3_R, 0))
        make_face()
    extrude(amount=16.2488161, mode=Mode.SUBTRACT)
    with BuildSketch(Plane(origin=(6.977295656, -15.312772762, 3.175), x_dir=(-0.04957343510019617, 0.9987704814081995, 0), z_dir=(-0.9987704814081996, -0.049573435100196184, 0))) as fillet3_piece_3:
        with BuildLine():
            CenterArc((FILLET3_R, FILLET3_R), FILLET3_R, 180, 90)
            Line((0, FILLET3_R), (0, 0))
            Line((0, 0), (FILLET3_R, 0))
        make_face()
    extrude(amount=18.678607238, mode=Mode.SUBTRACT)
    with BuildSketch(Plane(origin=(9.9949, 6.096, 3.175), x_dir=(0, 0, -1), z_dir=(0, -1, 0))) as fillet3_piece_4:
        with BuildLine():
            CenterArc((FILLET3_R, -FILLET3_R), FILLET3_R, 90, 90)
            Line((0, -FILLET3_R), (0, 0))
            Line((0, 0), (FILLET3_R, 0))
        make_face()
    extrude(amount=18.237676483, mode=Mode.SUBTRACT)
    with BuildSketch(Plane(origin=(-11.835741543, -13.067639207, 3.175), x_dir=(0.04957343510019569, -0.9987704814081997, 0), z_dir=(0.9987704814081997, 0.04957343510019569, 0))) as fillet3_piece_5:
        with BuildLine():
            CenterArc((3.175 - FILLET3_R, FILLET3_R), FILLET3_R, 270, 90)
            Line((3.175, FILLET3_R), (3.175, 0))
            Line((3.175, 0), (3.175 - FILLET3_R, 0))
        make_face()
    revolve(axis=Axis((-11.835741543, -13.067639207, 3.175), (0, 0, -1)), revolution_arc=100, mode=Mode.SUBTRACT)
    with BuildSketch(Plane(origin=(6.8199, -12.141676483, 3.175), x_dir=(1, 0, 0), z_dir=(0, 1, 0))) as fillet3_piece_6:
        with BuildLine():
            CenterArc((3.175 - FILLET3_R, FILLET3_R), FILLET3_R, 270, 90)
            Line((3.175, FILLET3_R), (3.175, 0))
            Line((3.175, 0), (3.175 - FILLET3_R, 0))
        make_face()
    revolve(axis=Axis((6.8199, -12.141676483, 3.175), (0, 0, -1)), revolution_arc=87.158486733, mode=Mode.SUBTRACT)
    with BuildSketch(Plane(origin=(6.8199, 6.096, 3.175), x_dir=(1, 0, 0), z_dir=(0, -1, 0))) as fillet3_piece_7:
        with BuildLine():
            CenterArc((3.175 - FILLET3_R, -FILLET3_R), FILLET3_R, 0, 90)
            Line((3.175 - FILLET3_R, 0), (3.175, 0))
            Line((3.175, 0), (3.175, -FILLET3_R))
        make_face()
    revolve(axis=Axis((6.8199, 6.096, 3.175), (0, 0, 1)), revolution_arc=90, mode=Mode.SUBTRACT)
    with BuildSketch(Plane(origin=(-9.4289161, 6.096, 3.175), x_dir=(0, 1, 0), z_dir=(1, 0, 0))) as fillet3_piece_8:
        with BuildLine():
            CenterArc((3.175 - FILLET3_R, -FILLET3_R), FILLET3_R, 0, 90)
            Line((3.175, -FILLET3_R), (3.175, 0))
            Line((3.175, 0), (3.175 - FILLET3_R, 0))
        make_face()
    revolve(axis=Axis((-9.4289161, 6.096, 3.175), (0, 0, 1)), revolution_arc=82.841513267, mode=Mode.SUBTRACT)


solid = part_1.part
